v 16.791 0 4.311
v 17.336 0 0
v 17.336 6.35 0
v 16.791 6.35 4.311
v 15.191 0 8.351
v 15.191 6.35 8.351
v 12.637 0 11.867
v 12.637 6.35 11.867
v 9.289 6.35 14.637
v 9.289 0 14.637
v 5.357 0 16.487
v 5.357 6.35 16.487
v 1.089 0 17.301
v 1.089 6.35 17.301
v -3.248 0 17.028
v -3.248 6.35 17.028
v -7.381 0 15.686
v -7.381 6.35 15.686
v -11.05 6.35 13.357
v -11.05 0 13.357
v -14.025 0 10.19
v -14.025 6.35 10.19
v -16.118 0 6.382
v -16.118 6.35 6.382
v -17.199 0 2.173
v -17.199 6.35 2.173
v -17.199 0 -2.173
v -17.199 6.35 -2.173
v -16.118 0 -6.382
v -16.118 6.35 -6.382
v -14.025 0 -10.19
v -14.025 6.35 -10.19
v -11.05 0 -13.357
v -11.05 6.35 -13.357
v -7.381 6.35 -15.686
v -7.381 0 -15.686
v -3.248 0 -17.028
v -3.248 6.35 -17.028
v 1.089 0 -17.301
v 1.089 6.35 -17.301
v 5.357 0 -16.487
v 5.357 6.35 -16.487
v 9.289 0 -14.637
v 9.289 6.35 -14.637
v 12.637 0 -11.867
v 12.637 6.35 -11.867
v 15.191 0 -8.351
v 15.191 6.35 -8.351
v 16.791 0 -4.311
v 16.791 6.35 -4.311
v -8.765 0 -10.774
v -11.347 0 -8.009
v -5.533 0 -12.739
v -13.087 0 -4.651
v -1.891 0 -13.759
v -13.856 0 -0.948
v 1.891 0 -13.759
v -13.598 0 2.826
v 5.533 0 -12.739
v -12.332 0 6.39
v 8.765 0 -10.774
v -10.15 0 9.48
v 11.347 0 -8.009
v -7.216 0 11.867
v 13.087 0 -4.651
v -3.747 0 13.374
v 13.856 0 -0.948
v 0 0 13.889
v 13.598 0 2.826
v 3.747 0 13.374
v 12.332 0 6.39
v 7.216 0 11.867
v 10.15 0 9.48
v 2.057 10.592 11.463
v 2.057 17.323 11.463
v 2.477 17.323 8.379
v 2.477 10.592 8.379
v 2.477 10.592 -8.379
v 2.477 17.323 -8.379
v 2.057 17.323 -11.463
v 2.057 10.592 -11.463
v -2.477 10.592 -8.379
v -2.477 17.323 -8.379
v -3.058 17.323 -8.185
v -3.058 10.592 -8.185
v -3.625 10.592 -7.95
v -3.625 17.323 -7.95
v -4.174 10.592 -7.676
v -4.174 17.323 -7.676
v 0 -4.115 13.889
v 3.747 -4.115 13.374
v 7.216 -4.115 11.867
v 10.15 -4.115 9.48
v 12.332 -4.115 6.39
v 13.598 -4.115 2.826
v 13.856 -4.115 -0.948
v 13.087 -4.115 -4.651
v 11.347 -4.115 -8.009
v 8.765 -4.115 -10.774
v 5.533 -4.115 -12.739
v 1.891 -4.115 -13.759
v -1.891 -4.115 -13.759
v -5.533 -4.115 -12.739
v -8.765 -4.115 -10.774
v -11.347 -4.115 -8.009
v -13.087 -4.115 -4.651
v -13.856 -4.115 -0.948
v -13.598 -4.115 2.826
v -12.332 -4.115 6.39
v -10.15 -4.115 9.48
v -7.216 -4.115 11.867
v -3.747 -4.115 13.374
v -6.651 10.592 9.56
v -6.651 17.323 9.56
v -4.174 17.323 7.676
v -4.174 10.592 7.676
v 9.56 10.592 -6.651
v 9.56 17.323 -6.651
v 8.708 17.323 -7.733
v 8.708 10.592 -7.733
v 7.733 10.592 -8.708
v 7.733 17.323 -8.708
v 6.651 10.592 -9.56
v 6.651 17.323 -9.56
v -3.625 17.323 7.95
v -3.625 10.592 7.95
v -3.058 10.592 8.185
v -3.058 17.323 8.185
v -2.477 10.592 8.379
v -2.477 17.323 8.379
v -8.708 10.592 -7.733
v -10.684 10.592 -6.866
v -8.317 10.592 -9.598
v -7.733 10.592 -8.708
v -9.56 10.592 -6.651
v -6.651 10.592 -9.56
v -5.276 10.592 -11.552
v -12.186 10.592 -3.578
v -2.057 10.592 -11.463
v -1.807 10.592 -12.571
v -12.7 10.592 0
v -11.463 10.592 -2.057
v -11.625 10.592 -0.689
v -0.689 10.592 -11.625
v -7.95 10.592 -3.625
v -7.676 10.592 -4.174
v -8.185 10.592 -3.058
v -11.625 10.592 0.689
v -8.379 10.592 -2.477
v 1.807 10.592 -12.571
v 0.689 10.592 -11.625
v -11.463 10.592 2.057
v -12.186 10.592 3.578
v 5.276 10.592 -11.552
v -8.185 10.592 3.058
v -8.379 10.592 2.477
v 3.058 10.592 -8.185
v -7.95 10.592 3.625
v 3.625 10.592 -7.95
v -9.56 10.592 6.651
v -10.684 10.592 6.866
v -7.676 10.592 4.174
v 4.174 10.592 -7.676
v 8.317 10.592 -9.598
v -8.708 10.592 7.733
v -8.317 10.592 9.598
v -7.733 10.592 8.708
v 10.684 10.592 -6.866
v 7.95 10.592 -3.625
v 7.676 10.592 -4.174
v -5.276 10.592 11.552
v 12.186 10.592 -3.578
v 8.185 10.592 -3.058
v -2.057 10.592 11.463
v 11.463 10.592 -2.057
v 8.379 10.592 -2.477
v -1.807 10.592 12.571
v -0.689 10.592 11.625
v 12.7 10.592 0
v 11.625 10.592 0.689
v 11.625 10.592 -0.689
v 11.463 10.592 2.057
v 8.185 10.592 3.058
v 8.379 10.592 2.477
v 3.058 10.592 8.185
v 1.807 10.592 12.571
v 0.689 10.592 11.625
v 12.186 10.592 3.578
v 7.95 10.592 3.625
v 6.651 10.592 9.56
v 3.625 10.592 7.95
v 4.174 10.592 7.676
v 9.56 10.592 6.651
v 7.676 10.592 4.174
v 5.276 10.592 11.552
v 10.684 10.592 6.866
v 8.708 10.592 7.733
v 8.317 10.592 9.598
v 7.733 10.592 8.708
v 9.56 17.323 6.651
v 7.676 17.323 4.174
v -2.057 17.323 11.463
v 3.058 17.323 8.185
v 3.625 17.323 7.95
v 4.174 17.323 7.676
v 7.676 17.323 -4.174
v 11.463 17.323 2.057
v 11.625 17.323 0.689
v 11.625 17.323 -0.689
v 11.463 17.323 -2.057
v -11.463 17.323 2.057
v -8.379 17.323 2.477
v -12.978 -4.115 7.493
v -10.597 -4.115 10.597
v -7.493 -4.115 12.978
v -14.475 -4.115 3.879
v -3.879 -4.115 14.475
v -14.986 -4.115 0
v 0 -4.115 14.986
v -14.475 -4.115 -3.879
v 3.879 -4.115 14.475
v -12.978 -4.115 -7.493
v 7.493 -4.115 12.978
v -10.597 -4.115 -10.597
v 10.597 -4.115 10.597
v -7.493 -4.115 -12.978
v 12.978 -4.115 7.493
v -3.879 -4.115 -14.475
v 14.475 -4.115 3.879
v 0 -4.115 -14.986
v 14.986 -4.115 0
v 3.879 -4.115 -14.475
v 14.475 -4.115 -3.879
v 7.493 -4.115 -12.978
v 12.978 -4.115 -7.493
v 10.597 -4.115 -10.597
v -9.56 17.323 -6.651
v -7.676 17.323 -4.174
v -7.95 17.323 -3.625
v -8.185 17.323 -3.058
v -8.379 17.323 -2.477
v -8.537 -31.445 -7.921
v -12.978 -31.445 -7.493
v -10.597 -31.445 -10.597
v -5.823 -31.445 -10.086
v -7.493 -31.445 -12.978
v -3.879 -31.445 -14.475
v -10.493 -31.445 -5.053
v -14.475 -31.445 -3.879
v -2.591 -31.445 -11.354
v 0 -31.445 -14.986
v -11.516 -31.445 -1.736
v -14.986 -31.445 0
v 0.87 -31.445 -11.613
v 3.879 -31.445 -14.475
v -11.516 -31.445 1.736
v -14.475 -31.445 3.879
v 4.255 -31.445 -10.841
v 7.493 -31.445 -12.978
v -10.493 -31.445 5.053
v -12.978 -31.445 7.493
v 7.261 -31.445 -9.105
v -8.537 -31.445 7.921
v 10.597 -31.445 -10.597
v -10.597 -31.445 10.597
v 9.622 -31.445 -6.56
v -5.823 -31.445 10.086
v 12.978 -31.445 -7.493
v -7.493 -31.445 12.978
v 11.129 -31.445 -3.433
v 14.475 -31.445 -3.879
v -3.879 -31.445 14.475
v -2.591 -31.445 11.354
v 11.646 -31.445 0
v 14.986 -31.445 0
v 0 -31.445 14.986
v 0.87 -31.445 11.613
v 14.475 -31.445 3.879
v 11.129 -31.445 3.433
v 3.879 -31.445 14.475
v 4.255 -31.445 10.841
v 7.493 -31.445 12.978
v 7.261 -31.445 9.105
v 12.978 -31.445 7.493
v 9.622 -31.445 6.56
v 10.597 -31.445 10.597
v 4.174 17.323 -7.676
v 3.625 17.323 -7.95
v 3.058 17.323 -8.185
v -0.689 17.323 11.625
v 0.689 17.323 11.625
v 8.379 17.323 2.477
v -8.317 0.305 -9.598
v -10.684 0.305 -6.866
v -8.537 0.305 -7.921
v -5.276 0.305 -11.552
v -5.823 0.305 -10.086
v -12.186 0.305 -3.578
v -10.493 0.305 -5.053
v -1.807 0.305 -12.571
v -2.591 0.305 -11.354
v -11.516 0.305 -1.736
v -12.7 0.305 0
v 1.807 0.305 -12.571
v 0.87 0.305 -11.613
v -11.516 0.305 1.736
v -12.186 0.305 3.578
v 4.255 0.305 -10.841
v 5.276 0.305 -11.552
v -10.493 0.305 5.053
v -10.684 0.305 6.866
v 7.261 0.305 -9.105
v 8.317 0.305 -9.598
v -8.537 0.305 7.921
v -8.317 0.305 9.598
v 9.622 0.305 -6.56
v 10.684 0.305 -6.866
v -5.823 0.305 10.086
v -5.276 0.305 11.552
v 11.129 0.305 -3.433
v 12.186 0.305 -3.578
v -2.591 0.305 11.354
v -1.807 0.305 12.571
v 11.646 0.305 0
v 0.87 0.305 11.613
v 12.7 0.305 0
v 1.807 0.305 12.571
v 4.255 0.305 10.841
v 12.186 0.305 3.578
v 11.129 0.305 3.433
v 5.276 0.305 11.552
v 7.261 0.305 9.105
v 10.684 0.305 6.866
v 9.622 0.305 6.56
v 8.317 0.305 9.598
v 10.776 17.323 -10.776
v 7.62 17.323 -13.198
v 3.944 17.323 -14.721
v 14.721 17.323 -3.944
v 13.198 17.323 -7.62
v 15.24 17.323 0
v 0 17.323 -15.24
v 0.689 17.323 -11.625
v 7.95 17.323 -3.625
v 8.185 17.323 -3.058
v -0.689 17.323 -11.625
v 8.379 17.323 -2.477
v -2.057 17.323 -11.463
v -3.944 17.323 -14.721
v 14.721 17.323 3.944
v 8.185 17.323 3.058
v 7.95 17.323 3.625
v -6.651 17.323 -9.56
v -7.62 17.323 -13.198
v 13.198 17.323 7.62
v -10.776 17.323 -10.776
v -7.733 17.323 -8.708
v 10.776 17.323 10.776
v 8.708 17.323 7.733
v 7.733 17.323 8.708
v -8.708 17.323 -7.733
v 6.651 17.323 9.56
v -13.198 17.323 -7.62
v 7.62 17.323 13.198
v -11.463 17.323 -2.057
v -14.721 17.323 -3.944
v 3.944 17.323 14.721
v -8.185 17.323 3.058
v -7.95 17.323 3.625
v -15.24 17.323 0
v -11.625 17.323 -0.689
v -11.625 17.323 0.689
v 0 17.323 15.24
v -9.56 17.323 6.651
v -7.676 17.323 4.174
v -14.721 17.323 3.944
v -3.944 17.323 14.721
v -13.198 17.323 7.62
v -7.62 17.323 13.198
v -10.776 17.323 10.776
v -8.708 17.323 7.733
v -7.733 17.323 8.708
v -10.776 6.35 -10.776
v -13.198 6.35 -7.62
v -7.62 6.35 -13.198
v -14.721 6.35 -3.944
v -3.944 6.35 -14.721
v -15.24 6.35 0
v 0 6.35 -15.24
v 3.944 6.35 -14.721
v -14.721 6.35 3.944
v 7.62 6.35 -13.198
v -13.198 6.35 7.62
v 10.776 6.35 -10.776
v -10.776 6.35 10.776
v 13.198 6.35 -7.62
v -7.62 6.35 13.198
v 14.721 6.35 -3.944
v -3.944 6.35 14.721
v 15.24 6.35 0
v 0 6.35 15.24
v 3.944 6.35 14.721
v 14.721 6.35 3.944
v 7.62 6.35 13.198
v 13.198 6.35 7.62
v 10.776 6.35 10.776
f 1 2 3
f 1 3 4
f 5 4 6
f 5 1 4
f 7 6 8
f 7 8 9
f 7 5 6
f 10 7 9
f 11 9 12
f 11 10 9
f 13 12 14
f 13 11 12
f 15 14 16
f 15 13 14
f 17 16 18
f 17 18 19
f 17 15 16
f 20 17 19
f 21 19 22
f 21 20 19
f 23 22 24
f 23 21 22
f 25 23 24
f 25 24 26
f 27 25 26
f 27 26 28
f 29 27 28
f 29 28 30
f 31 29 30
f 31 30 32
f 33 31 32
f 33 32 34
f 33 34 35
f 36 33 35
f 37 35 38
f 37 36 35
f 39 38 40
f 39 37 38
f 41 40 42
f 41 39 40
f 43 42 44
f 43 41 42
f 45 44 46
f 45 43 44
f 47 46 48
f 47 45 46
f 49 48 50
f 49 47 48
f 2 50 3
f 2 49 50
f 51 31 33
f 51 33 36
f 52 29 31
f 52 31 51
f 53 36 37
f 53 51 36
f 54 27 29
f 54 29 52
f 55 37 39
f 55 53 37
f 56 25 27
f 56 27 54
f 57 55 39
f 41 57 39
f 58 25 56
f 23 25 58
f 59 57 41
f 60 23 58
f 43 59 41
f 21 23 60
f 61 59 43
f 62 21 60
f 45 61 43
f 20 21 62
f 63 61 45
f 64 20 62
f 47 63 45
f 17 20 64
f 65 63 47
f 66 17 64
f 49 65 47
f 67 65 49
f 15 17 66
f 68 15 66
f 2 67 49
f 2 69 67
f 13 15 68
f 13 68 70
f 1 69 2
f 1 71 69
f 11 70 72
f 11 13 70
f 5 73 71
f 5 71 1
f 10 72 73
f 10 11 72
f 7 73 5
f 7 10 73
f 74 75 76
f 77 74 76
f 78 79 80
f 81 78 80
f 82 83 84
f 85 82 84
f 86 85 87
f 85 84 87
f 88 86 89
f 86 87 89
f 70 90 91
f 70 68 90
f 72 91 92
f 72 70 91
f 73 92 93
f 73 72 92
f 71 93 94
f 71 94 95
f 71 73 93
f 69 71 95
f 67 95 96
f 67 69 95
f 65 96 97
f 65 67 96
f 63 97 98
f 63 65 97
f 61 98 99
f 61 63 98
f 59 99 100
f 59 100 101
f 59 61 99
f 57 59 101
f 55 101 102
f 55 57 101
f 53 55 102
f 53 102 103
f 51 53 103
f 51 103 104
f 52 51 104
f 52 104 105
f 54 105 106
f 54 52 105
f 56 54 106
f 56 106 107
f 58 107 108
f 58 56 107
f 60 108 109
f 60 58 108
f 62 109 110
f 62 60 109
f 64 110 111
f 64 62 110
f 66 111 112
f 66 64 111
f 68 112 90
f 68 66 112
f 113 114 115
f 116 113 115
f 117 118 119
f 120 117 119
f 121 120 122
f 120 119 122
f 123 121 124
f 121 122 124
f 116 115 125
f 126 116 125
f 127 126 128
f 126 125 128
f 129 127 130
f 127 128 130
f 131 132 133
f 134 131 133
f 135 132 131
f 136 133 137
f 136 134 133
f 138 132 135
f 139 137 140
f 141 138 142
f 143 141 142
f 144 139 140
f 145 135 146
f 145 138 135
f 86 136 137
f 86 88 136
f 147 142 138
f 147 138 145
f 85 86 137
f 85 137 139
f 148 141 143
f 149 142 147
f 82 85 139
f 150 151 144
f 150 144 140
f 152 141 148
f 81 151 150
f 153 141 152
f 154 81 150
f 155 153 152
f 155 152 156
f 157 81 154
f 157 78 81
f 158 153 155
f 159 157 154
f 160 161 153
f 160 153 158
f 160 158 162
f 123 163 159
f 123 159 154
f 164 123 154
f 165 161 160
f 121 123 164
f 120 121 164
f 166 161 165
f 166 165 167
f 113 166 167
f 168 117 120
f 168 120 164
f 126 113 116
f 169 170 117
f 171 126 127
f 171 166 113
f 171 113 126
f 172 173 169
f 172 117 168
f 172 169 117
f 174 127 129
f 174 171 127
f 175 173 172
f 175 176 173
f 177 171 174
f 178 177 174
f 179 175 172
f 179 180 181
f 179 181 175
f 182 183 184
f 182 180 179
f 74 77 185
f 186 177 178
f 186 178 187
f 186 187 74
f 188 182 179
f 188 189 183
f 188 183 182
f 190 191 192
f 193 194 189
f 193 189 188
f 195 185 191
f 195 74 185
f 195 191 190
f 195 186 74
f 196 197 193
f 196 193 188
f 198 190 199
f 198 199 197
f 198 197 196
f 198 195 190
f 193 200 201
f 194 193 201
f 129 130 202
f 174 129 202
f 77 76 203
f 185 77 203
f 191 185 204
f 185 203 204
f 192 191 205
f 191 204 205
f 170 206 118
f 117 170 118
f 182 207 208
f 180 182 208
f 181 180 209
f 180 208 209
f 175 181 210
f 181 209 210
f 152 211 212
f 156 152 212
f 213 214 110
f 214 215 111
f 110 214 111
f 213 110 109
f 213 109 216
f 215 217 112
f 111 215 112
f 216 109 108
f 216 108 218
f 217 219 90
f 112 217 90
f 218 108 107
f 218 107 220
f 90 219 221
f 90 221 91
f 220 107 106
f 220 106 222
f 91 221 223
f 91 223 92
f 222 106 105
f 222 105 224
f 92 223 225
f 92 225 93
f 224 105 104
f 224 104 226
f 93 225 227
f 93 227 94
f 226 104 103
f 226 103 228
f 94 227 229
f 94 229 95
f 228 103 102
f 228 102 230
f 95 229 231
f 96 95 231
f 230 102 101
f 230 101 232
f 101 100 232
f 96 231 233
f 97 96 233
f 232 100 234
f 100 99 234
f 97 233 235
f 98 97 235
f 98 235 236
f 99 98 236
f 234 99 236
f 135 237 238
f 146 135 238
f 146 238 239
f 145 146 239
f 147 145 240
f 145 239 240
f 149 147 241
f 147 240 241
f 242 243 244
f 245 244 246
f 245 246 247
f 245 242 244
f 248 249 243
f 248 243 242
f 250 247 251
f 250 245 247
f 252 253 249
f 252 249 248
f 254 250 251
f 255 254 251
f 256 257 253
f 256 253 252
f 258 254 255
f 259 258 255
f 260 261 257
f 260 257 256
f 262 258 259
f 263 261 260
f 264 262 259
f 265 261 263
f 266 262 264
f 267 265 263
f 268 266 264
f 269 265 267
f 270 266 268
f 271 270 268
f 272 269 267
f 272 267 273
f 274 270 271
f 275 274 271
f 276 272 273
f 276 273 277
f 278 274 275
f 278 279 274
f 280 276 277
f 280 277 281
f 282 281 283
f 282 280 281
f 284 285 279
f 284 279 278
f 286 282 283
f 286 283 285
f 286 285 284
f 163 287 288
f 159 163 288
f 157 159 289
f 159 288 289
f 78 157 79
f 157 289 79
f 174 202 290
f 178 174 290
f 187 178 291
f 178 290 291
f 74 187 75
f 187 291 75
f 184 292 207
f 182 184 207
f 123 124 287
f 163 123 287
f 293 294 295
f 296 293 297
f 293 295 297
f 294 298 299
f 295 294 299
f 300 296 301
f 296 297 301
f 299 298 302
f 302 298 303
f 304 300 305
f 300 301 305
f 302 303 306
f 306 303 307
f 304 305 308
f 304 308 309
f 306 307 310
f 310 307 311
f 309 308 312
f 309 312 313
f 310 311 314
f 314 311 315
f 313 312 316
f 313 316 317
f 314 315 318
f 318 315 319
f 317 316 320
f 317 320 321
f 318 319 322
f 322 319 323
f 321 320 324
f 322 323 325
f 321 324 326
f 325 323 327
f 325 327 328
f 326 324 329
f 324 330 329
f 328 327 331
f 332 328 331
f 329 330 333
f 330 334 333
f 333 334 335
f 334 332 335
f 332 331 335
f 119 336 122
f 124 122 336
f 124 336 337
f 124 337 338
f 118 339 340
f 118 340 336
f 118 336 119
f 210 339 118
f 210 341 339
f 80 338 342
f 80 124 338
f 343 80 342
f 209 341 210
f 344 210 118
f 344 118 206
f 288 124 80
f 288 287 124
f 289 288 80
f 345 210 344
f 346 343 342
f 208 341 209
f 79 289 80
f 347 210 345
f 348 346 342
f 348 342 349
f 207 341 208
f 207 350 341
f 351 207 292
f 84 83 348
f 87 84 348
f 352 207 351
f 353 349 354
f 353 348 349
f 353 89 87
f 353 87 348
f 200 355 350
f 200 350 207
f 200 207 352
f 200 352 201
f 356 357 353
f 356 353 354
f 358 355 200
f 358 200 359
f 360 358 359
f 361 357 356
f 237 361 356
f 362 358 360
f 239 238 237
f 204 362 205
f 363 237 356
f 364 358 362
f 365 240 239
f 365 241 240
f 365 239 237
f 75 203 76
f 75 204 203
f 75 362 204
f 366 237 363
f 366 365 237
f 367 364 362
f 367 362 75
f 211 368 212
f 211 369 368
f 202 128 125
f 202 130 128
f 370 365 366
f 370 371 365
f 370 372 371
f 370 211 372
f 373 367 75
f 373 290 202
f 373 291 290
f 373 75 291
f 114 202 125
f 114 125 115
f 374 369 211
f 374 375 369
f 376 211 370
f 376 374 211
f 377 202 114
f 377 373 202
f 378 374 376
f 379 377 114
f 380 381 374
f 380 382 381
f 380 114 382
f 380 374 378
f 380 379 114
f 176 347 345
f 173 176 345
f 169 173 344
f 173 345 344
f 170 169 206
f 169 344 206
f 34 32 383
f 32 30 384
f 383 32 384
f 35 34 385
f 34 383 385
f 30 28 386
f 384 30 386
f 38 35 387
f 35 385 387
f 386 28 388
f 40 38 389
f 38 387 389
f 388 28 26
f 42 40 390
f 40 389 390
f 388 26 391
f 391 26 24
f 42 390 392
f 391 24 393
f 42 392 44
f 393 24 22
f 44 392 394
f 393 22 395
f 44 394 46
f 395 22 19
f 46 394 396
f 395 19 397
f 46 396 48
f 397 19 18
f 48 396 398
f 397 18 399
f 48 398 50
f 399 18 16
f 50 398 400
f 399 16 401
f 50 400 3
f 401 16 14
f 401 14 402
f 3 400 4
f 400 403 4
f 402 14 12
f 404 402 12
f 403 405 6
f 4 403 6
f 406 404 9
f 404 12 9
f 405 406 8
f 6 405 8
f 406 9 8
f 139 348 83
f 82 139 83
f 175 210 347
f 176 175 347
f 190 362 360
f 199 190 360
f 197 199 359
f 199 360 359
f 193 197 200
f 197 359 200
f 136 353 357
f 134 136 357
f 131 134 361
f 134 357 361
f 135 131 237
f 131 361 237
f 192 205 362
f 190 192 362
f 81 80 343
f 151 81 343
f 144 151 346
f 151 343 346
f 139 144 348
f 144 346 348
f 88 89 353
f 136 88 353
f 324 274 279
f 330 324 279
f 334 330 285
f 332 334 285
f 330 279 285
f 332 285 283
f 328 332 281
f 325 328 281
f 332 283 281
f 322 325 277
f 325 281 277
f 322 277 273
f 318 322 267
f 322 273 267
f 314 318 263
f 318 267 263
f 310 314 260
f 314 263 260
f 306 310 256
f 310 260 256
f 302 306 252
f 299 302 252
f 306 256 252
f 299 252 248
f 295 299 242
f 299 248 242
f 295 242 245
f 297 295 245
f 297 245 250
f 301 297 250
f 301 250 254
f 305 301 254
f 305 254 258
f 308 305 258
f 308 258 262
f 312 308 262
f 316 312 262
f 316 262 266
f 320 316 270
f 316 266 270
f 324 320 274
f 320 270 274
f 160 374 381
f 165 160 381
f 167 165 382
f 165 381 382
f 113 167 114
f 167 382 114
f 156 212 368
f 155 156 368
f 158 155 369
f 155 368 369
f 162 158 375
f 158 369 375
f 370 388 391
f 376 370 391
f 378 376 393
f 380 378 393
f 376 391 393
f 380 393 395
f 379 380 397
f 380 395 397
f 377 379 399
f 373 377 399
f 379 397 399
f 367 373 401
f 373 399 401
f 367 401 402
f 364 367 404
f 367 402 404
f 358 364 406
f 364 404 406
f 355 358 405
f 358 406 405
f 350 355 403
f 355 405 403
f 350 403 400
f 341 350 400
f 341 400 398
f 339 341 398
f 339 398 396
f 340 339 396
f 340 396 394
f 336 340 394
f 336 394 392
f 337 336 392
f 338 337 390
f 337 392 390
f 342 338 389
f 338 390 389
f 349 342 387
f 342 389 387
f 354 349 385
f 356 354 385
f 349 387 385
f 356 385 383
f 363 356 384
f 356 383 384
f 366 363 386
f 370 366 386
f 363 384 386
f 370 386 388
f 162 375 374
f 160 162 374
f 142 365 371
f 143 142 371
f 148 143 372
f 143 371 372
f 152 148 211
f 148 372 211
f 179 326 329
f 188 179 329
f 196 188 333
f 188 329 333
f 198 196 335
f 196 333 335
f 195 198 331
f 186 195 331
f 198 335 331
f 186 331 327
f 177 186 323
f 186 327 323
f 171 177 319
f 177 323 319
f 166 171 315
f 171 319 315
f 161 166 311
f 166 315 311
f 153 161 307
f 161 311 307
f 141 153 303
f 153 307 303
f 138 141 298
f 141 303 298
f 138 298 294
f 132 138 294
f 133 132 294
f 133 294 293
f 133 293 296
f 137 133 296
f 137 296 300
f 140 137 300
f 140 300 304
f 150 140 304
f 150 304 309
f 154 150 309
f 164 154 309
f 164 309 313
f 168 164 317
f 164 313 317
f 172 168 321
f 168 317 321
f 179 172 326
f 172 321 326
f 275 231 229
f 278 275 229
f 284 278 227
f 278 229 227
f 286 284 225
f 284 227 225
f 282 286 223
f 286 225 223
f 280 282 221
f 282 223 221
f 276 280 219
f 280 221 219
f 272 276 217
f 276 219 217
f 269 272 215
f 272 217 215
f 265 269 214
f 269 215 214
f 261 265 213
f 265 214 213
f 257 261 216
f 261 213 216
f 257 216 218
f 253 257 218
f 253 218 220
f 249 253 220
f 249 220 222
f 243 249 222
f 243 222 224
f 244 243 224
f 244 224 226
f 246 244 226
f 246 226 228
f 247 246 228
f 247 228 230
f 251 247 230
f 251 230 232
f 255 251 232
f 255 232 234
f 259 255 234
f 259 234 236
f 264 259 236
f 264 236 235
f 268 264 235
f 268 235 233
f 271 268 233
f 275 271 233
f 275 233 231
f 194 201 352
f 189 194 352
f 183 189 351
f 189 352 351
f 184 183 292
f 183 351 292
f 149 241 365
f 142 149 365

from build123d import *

# Parameters (mm, degrees)
F0_R      = 17.3355
F1_DEPTH  = 6.35
F2_R      = 14.986
F3_DEPTH  = 31.4452
F4_R      = 15.24
F5_DEPTH  = 10.9728
F6_W      = 4.1148
F6_H      = 1.09728
F8_R      = 11.6459
F9_DEPTH  = 31.75
F10_R     = 12.7
F11_DEPTH = 10.287
F13_DEPTH = 6.731


with BuildPart() as f1:
    # F0 (on Front) → F1 (new body)
    with BuildSketch(Plane.XZ):
        Circle(F0_R)
    extrude(amount=-F1_DEPTH)

    # F2 (on face) → F3 (join)
    with BuildSketch(Plane.XZ):
        Circle(F2_R)
    extrude(amount=F3_DEPTH)

    # F4 (on face) → F5 (join)
    with BuildSketch(Plane(origin=(0, 6.35, 0), x_dir=(-1, 0, 0), z_dir=(0, 1, 0))):
        Circle(F4_R)
    extrude(amount=F5_DEPTH)

    # F6 (on Right) → F7 (revolve, cut)
    with BuildSketch(Plane.YZ):
        with Locations((-2.0574, 14.43736)):
            Rectangle(F6_W, F6_H)
    revolve(axis=Axis((0, -0.221021, 0), (0, 1, 0)), mode=Mode.SUBTRACT)

    # F8 (on face) → F9 (cut)
    with BuildSketch(Plane.XZ.offset(31.4452)):
        Circle(F8_R)
    extrude(amount=-F9_DEPTH, mode=Mode.SUBTRACT)

    # F10 (on face) → F11 (cut)
    with BuildSketch(Plane.XZ.offset(-0.3048)):
        Circle(F10_R)
    extrude(amount=-F11_DEPTH, mode=Mode.SUBTRACT)

    # F12 (on face) → F13 (cut, through all)
    with BuildSketch(Plane(origin=(0, 17.3228, 0), x_dir=(-1, 0, 0), z_dir=(0, 1, 0))):
        with BuildLine():
            Line((-4.173907, 7.676207), (-6.65057, 9.560173))
            ThreePointArc((-6.65057, 9.560173), (-8.234895, 8.234895), (-9.560173, 6.65057))
            Line((-9.560173, 6.65057), (-7.676207, 4.173907))
            ThreePointArc((-7.676207, 4.173907), (-8.07249, 3.343735), (-8.379296, 2.4765))
            Line((-8.379296, 2.4765), (-11.462726, 2.0574))
            ThreePointArc((-11.462726, 2.0574), (-11.6459, 0), (-11.462726, -2.0574))
            Line((-11.462726, -2.0574), (-8.379296, -2.4765))
            ThreePointArc((-8.379296, -2.4765), (-8.07249, -3.343735), (-7.676207, -4.173907))
            Line((-7.676207, -4.173907), (-9.560173, -6.65057))
            ThreePointArc((-9.560173, -6.65057), (-8.234895, -8.234895), (-6.65057, -9.560173))
            Line((-6.65057, -9.560173), (-4.173907, -7.676207))
            ThreePointArc((-4.173907, -7.676207), (-3.343735, -8.07249), (-2.4765, -8.379296))
            Line((-2.4765, -8.379296), (-2.0574, -11.462726))
            ThreePointArc((-2.0574, -11.462726), (0, -11.6459), (2.0574, -11.462726))
            Line((2.0574, -11.462726), (2.4765, -8.379296))
            ThreePointArc((2.4765, -8.379296), (3.343735, -8.07249), (4.173907, -7.676207))
            Line((4.173907, -7.676207), (6.65057, -9.560173))
            ThreePointArc((6.65057, -9.560173), (8.234895, -8.234895), (9.560173, -6.65057))
            Line((9.560173, -6.65057), (7.676207, -4.173907))
            ThreePointArc((7.676207, -4.173907), (8.07249, -3.343735), (8.379296, -2.4765))
            Line((8.379296, -2.4765), (11.462726, -2.0574))
            ThreePointArc((11.462726, -2.0574), (11.6459, 0), (11.462726, 2.0574))
            Line((11.462726, 2.0574), (8.379296, 2.4765))
            ThreePointArc((8.379296, 2.4765), (8.07249, 3.343735), (7.676207, 4.173907))
            Line((7.676207, 4.173907), (9.560173, 6.65057))
            ThreePointArc((9.560173, 6.65057), (8.234895, 8.234895), (6.65057, 9.560173))
            Line((6.65057, 9.560173), (4.173907, 7.676207))
            ThreePointArc((4.173907, 7.676207), (3.343735, 8.07249), (2.4765, 8.379296))
            Line((2.4765, 8.379296), (2.0574, 11.462726))
            ThreePointArc((2.0574, 11.462726), (0, 11.6459), (-2.0574, 11.462726))
            Line((-2.0574, 11.462726), (-2.4765, 8.379296))
            ThreePointArc((-2.4765, 8.379296), (-3.343735, 8.07249), (-4.173907, 7.676207))
        make_face()
    extrude(amount=-F13_DEPTH, mode=Mode.SUBTRACT)


solid = f1.part
